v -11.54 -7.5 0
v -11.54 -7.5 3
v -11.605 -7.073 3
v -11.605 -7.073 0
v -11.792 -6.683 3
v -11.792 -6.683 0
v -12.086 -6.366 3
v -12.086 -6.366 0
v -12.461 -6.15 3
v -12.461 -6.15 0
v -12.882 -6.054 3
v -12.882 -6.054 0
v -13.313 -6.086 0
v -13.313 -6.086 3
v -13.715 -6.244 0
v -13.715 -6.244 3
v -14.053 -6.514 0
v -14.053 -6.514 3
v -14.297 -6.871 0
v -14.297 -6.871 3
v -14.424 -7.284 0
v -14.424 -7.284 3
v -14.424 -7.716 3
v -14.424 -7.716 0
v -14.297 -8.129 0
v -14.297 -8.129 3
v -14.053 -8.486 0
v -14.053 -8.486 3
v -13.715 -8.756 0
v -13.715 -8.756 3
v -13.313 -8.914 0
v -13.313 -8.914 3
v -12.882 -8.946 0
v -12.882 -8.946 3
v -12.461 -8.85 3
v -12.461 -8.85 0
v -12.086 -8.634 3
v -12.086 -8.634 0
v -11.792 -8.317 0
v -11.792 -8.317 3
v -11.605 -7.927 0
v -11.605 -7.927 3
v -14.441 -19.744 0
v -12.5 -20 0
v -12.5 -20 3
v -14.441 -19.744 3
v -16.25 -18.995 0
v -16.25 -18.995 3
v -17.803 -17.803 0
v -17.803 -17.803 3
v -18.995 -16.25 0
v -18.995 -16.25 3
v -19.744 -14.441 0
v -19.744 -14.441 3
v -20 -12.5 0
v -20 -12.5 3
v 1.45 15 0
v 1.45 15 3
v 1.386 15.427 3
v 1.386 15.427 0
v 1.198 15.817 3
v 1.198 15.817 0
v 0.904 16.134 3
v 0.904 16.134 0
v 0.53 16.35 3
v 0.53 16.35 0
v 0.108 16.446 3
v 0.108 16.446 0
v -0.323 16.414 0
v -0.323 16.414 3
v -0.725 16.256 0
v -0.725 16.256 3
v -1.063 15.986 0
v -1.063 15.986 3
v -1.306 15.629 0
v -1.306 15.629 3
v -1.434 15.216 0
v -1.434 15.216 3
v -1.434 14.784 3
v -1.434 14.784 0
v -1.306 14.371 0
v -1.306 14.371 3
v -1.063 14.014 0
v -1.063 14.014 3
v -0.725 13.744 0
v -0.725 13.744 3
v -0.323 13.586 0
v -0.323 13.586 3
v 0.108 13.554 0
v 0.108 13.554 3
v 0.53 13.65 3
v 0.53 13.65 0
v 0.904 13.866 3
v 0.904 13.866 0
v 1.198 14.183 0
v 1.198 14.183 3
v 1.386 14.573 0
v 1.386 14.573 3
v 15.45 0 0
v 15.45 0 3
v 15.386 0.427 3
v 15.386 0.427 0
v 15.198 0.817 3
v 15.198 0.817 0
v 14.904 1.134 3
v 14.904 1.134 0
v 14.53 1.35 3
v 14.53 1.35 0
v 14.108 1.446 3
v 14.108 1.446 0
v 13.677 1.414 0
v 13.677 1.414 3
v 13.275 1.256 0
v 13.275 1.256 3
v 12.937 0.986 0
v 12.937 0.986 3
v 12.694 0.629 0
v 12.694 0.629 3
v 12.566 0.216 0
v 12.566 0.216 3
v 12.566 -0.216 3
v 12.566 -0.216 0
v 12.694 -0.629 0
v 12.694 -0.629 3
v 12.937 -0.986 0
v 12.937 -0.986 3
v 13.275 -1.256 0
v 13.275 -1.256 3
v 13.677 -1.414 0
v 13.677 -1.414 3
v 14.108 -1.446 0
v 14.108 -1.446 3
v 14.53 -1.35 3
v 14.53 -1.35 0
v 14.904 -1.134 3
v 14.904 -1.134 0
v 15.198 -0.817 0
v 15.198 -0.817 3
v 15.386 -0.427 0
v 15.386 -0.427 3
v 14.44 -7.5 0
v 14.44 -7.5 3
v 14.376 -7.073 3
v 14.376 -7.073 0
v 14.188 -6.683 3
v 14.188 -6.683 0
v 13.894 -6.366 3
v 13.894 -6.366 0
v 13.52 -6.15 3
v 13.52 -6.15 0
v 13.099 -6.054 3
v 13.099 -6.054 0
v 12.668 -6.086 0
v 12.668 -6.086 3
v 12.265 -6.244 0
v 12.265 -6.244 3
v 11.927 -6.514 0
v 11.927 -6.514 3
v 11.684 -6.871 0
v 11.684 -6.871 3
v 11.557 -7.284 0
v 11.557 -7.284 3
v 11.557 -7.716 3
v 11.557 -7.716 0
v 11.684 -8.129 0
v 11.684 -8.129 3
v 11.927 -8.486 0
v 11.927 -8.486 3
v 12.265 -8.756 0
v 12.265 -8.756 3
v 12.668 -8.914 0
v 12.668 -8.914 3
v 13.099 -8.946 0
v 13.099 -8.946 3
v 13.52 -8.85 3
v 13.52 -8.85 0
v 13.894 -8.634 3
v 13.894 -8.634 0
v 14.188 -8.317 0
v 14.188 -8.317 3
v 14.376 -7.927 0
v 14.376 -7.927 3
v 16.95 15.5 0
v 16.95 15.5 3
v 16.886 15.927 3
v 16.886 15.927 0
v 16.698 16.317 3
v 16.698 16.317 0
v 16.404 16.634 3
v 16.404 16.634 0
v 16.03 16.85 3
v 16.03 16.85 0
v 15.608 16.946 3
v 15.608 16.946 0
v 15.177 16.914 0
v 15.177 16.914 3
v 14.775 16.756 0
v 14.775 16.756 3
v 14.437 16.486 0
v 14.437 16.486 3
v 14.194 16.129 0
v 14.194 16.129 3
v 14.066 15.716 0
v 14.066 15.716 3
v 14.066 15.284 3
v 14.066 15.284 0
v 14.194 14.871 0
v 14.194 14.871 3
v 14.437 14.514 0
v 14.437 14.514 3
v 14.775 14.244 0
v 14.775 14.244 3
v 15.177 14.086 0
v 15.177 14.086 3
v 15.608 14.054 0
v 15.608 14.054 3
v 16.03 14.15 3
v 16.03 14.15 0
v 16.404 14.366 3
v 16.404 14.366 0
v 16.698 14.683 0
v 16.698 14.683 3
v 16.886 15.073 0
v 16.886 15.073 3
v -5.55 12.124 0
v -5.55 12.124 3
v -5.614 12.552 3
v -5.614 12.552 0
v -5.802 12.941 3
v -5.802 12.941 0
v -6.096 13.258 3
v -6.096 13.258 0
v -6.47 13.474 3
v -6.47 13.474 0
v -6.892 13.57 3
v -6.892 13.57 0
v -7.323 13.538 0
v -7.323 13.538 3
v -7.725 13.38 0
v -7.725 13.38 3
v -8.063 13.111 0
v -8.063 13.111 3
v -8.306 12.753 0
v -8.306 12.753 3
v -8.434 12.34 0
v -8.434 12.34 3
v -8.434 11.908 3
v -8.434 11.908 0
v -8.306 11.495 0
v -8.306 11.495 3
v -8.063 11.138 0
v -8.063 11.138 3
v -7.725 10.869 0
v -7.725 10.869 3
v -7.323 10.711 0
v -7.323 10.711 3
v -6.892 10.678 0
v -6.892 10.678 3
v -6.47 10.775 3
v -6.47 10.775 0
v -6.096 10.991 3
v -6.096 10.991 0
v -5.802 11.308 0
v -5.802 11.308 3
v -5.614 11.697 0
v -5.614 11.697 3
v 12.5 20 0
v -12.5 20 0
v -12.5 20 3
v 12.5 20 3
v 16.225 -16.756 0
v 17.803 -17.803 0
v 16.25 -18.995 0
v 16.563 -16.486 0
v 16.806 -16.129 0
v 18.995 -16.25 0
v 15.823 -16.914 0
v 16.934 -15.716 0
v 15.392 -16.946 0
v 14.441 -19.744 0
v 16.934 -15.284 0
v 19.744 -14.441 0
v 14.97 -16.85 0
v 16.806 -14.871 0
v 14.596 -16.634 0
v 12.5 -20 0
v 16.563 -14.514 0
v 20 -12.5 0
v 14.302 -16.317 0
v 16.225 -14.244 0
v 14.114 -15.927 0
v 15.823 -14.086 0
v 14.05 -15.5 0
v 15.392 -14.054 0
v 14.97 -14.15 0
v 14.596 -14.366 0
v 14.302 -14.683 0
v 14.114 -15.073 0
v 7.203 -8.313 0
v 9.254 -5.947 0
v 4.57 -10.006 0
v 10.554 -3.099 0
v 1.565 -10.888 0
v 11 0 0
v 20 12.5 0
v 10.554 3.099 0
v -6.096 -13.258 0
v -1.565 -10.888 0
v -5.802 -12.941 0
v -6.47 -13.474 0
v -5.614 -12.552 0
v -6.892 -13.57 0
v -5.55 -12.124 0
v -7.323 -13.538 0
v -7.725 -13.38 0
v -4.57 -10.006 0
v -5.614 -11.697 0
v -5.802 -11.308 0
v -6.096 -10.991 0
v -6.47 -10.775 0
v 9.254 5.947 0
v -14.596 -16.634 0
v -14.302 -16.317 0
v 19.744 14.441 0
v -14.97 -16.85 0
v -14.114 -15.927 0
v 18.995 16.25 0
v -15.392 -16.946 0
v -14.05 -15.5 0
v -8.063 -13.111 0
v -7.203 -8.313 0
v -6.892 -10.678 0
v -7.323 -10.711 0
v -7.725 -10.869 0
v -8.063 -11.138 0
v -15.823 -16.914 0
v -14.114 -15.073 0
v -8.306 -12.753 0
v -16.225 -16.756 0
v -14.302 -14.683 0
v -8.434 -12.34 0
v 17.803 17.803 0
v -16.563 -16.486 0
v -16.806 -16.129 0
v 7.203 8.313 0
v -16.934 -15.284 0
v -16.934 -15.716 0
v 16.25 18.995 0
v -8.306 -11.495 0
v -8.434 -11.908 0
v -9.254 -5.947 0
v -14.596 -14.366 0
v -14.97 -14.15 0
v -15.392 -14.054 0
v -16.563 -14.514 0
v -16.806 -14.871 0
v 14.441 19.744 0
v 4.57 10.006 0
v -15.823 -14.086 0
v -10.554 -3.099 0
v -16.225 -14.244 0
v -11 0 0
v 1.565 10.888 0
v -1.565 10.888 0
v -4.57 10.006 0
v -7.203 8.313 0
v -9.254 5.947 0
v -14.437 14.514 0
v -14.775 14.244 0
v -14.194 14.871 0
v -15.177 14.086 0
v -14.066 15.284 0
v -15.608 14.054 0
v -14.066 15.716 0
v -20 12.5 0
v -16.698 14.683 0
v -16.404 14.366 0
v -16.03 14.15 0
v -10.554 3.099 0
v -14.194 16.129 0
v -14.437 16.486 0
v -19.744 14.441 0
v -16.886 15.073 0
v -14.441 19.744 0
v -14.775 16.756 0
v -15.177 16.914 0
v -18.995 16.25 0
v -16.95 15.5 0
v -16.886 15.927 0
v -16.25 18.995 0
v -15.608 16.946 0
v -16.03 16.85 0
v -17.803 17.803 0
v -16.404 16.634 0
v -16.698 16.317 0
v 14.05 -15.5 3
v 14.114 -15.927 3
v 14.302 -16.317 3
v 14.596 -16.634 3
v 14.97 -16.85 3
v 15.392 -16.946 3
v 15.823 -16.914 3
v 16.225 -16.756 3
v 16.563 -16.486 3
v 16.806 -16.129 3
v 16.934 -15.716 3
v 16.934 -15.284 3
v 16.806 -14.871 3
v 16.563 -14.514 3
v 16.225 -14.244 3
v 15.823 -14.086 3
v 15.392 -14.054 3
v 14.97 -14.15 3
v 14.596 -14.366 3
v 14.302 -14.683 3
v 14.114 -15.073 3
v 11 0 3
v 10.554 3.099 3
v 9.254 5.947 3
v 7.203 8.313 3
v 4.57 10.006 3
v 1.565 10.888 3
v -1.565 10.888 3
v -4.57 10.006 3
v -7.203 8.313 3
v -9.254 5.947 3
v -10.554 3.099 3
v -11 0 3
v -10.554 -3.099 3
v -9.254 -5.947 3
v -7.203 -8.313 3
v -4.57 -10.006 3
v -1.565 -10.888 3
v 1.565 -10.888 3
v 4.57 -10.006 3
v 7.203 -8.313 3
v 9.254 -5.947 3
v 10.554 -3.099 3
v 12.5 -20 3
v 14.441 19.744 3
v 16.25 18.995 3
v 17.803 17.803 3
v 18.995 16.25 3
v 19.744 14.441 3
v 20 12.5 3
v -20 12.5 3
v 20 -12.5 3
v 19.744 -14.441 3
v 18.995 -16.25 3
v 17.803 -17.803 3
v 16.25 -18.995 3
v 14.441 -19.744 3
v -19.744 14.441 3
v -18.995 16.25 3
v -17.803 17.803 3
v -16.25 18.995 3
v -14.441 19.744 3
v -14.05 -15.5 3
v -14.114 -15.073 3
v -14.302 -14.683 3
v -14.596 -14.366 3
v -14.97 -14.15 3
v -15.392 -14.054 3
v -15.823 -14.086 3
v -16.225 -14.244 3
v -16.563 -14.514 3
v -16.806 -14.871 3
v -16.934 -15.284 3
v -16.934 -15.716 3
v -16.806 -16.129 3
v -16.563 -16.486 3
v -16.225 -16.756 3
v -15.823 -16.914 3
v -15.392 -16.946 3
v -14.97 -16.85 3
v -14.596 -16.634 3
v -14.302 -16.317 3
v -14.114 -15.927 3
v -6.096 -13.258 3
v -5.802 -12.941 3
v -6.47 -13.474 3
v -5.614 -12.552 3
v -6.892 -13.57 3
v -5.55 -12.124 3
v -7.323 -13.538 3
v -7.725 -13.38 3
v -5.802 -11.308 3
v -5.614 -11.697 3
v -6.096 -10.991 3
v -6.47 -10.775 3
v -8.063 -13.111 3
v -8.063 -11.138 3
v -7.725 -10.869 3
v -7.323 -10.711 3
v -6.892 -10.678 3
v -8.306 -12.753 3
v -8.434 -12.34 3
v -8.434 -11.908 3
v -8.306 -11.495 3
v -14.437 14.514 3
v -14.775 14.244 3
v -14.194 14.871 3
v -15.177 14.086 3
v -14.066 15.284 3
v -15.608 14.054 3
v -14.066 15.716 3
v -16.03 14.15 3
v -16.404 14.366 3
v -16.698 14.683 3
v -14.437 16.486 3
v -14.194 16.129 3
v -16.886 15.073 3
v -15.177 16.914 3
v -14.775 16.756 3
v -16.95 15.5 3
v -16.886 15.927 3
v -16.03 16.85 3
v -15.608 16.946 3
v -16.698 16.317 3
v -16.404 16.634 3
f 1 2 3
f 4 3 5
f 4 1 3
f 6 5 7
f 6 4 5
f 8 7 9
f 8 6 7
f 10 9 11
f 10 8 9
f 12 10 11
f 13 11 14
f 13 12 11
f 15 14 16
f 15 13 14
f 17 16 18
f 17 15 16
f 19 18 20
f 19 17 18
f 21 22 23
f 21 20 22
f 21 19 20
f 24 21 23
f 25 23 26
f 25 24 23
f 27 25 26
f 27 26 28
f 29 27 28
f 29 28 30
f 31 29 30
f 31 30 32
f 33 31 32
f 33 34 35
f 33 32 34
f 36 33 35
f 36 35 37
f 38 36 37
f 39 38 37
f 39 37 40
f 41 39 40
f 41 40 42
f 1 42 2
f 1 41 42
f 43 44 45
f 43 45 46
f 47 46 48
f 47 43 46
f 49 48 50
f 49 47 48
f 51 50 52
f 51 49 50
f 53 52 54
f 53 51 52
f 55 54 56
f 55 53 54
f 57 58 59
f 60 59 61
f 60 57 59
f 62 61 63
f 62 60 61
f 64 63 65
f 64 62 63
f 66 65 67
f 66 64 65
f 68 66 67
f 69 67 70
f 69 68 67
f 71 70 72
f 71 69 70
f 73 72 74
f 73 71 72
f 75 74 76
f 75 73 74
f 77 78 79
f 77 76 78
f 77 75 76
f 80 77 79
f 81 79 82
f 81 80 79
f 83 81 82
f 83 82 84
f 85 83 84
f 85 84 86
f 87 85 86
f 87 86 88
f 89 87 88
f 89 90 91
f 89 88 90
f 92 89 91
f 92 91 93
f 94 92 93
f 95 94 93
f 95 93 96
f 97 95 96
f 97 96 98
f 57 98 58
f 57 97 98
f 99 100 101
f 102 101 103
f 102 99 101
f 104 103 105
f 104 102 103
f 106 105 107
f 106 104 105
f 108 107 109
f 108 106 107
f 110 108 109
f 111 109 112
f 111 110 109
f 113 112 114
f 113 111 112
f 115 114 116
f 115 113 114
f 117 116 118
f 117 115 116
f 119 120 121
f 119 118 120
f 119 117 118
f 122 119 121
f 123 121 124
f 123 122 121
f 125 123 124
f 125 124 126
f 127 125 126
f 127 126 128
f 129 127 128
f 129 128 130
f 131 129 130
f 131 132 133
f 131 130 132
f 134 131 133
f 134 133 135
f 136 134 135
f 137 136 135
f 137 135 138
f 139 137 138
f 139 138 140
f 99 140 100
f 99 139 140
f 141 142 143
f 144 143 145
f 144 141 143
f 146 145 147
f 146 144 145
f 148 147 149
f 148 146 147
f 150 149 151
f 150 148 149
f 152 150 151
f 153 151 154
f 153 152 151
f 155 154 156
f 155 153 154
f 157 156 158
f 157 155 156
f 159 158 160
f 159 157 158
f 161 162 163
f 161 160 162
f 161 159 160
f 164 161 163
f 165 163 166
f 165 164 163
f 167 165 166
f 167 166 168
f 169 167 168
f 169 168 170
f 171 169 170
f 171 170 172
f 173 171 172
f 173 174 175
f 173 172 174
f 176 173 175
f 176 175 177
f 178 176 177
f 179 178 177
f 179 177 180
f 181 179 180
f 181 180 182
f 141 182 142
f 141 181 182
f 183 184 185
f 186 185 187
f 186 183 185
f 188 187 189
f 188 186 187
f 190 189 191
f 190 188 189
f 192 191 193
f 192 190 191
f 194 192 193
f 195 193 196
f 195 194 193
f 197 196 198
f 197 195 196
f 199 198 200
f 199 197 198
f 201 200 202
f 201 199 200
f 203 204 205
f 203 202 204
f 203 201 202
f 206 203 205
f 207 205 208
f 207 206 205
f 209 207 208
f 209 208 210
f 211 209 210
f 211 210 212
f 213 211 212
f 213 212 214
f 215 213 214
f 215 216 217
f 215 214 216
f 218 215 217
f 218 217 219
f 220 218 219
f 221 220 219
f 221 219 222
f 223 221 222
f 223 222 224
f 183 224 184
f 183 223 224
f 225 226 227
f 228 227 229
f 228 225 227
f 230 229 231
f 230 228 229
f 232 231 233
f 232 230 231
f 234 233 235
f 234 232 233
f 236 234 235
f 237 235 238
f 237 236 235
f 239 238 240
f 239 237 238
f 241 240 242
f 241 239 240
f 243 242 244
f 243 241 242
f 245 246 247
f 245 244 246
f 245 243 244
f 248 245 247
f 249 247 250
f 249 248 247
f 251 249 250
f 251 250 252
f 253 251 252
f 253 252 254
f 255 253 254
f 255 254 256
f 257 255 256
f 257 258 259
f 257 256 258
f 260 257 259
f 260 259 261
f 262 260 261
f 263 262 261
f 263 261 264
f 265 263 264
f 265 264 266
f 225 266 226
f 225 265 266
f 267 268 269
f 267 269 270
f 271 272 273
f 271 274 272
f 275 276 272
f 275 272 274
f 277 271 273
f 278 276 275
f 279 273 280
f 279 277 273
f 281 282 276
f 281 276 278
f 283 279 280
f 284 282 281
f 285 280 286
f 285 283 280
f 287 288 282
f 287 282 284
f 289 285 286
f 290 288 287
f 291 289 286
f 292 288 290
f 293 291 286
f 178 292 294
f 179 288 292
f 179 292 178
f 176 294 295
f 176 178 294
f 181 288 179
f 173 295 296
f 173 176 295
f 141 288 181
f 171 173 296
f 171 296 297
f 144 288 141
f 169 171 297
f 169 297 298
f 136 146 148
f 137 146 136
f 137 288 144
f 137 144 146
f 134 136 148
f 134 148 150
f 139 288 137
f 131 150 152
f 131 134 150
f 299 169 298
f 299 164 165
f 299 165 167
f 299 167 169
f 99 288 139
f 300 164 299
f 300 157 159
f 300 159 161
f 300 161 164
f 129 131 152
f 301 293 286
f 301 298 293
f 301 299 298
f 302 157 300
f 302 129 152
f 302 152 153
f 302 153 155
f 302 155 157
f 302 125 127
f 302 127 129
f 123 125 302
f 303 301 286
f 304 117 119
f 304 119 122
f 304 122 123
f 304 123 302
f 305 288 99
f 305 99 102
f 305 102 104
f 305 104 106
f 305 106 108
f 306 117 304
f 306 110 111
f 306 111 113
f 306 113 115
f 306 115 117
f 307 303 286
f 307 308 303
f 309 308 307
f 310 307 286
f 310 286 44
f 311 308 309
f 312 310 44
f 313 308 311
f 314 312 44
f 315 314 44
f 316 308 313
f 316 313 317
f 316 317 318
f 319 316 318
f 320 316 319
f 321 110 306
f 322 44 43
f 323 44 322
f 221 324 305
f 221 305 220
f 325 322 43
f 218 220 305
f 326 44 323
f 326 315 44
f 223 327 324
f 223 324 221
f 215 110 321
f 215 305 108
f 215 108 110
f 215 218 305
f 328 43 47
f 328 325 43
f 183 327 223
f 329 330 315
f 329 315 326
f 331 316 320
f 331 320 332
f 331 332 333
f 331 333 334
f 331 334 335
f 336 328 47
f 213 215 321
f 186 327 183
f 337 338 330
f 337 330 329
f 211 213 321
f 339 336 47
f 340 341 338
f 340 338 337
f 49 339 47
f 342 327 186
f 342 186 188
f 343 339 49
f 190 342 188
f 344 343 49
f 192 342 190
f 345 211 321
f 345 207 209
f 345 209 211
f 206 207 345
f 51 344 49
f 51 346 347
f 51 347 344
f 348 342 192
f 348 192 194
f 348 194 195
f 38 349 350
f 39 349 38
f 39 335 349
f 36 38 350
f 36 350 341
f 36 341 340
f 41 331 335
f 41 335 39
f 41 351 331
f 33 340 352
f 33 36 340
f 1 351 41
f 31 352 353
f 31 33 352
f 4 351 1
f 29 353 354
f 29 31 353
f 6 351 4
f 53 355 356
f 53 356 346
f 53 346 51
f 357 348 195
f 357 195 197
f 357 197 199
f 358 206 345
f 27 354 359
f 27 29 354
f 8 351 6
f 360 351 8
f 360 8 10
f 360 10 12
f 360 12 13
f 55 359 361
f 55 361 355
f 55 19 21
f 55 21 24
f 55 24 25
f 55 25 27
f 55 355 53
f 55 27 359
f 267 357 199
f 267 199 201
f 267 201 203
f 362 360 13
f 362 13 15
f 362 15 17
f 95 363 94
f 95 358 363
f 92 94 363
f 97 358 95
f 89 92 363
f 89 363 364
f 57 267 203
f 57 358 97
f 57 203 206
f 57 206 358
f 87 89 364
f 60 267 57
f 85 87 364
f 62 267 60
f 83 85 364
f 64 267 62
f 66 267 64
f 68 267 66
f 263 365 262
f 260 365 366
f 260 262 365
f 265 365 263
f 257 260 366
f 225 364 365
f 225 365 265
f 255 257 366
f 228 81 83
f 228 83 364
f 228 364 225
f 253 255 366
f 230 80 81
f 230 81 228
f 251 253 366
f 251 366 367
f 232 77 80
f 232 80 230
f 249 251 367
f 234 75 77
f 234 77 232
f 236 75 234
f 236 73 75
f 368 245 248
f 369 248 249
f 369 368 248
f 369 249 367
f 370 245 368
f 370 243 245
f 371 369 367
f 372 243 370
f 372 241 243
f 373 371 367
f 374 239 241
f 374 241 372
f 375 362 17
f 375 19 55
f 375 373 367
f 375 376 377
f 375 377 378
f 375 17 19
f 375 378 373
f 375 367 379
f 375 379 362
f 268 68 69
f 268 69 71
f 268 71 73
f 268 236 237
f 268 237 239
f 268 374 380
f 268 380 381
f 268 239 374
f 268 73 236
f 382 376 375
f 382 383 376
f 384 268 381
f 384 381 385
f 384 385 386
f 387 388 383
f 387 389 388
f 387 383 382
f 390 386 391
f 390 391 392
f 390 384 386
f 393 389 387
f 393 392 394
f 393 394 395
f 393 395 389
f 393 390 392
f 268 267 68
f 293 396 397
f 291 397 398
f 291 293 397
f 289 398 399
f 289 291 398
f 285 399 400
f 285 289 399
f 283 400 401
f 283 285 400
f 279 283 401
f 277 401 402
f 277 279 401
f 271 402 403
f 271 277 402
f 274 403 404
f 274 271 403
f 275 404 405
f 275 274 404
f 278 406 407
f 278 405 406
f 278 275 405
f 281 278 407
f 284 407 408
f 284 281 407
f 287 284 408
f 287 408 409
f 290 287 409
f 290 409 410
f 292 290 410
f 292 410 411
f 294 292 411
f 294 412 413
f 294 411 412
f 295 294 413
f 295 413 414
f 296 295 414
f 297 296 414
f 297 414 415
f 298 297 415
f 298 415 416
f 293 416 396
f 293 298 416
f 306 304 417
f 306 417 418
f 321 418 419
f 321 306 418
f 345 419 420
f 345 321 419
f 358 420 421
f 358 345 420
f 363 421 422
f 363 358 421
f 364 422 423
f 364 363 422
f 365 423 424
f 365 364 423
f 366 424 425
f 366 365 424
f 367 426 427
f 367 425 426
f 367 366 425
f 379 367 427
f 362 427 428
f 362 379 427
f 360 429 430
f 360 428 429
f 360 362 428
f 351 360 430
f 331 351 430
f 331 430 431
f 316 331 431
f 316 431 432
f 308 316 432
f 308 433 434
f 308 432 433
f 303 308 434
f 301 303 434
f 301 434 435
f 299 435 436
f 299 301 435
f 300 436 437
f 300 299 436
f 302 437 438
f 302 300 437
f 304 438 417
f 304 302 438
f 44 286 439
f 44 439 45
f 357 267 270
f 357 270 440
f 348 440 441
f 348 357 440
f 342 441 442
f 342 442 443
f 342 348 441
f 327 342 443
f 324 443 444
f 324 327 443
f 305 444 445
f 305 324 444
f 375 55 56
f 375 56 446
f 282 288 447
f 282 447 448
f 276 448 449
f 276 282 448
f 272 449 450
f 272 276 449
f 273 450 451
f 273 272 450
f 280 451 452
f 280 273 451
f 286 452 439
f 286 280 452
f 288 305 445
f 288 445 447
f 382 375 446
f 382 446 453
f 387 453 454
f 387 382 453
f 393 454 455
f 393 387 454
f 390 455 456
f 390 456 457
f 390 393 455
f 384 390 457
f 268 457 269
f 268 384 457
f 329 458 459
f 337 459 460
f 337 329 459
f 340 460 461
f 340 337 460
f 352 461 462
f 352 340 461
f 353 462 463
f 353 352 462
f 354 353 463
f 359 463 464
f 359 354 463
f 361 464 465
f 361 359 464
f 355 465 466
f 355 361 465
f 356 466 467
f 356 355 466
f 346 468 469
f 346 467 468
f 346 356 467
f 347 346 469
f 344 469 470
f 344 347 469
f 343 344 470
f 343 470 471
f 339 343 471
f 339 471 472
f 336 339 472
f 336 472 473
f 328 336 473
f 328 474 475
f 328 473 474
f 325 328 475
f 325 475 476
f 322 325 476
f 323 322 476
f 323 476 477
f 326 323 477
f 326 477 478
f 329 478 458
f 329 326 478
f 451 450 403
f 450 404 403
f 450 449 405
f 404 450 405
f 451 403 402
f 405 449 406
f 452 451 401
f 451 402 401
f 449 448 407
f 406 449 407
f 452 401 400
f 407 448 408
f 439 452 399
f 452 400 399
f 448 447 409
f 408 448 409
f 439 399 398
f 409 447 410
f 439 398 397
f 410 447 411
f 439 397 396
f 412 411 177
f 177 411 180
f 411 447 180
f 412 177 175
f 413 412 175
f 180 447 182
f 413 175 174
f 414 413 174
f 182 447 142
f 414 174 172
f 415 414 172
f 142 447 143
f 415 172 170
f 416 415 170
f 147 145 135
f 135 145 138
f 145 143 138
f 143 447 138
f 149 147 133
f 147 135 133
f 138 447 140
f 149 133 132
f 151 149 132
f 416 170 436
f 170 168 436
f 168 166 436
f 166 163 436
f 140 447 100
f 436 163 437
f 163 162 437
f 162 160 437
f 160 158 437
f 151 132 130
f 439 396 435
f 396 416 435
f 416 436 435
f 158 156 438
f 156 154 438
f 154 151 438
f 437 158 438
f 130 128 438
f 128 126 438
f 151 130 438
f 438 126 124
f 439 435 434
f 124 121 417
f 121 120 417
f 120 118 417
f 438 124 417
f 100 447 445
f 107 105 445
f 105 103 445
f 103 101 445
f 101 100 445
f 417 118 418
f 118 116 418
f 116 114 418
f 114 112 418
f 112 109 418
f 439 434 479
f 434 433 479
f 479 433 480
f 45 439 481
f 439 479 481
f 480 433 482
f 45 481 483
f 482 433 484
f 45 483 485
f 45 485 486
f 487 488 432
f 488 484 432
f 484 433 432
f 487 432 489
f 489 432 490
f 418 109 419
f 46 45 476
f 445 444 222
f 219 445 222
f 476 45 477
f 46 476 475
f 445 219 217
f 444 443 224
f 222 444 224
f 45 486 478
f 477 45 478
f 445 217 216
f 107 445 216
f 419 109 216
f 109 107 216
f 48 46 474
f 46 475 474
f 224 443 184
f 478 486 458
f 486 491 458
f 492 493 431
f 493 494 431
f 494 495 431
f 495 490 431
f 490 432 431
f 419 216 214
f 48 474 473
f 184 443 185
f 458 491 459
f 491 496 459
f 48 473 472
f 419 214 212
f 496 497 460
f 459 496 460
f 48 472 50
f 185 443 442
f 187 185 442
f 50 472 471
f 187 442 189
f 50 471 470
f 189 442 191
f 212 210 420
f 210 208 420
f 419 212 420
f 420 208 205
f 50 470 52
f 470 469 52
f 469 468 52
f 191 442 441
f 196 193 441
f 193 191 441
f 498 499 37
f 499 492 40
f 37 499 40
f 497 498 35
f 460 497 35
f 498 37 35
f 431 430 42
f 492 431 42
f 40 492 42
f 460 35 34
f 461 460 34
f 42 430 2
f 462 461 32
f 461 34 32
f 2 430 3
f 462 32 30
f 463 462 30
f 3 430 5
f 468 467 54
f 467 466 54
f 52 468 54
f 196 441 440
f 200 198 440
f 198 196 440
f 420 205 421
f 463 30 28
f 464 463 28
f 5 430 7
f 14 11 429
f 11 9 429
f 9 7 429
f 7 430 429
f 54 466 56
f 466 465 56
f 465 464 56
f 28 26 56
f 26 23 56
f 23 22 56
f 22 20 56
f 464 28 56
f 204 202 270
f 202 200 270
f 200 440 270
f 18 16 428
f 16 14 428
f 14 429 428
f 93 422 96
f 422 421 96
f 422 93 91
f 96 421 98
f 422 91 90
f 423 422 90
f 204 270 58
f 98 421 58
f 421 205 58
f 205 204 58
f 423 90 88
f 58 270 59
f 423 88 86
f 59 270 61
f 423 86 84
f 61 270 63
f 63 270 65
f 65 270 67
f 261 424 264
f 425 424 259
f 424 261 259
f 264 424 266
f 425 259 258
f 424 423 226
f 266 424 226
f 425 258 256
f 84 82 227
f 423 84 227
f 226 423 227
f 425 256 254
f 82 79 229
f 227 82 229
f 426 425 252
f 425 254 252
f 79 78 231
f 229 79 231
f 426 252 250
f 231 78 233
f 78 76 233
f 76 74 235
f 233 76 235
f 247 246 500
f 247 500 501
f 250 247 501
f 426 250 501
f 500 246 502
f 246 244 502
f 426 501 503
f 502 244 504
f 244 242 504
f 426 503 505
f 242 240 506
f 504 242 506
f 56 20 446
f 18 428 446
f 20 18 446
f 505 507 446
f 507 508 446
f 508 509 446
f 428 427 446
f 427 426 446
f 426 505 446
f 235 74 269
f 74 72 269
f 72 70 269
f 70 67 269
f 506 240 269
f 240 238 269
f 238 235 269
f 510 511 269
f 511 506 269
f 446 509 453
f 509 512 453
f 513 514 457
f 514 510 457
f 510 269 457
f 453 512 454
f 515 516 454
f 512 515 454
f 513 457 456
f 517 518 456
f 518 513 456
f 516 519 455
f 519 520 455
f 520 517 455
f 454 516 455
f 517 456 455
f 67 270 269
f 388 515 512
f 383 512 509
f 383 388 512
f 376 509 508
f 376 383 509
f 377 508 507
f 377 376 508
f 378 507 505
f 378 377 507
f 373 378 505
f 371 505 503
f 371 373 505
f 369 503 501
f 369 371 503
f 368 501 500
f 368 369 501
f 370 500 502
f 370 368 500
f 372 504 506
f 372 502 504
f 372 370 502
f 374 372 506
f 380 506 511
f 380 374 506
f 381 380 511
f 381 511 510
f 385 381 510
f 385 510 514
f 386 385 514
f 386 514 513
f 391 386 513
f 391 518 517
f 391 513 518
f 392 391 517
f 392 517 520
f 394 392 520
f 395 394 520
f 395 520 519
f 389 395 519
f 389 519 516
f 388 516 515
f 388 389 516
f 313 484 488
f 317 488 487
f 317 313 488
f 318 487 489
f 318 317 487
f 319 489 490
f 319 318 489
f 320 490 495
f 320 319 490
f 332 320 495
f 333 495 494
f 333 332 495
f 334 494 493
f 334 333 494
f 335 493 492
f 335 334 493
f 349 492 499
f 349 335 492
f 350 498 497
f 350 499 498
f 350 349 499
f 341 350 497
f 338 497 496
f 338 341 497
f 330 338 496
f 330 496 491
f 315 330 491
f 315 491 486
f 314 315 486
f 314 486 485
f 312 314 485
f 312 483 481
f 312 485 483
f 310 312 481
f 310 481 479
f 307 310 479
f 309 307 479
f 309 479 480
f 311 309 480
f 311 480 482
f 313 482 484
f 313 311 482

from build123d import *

# Parameters (mm, degrees)
EXTRUDE_1_DEPTH     = 3
SKETCH_2_R          = 1.45
SKETCH_2_R_2        = 11
CUT_EXTRUDE_1_DEPTH = 5


with BuildPart() as part:
    # 草图1 → 凸台-拉伸1 (new body)
    with BuildSketch(Plane.XY):
        with BuildLine():
            Line((-12.500001384, 20), (12.499999997, 20))
            ThreePointArc((12.499999997, 20), (17.803300858, 17.80330086), (20, 12.5))
            Line((20, 12.5), (20, -12.5))
            ThreePointArc((20, -12.5), (17.803300859, -17.803300859), (12.5, -20))
            Line((12.5, -20), (-12.5, -20))
            ThreePointArc((-12.5, -20), (-17.80330064, -17.803301077), (-20, -12.500000618))
            Line((-20, -12.500000618), (-20, 12.5))
            ThreePointArc((-20, 12.5), (-17.803301348, 17.80330037), (-12.500001384, 20))
        make_face()
    extrude(amount=EXTRUDE_1_DEPTH)

    # 草图2 → 切除-拉伸1 (cut)
    with BuildSketch(Plane.XY):
        with Locations((15.5, 15.5)):
            Circle(SKETCH_2_R)
        with Locations(Location((-15.5, 15.5, 0), (0, 0, 180))):
            Circle(SKETCH_2_R)
        with Locations(Location((15.5, -15.5, 0), (0, 0, 180))):
            Circle(SKETCH_2_R)
        with Locations((-15.5, -15.5)):
            Circle(SKETCH_2_R)
        with Locations((0, 15)):
            Circle(SKETCH_2_R)
        with Locations((14, 0)):
            Circle(SKETCH_2_R)
        with Locations((-7, -12.124355653)):
            Circle(SKETCH_2_R)
        with Locations((-12.990381057, -7.5)):
            Circle(SKETCH_2_R)
        with Locations((12.990381057, -7.5)):
            Circle(SKETCH_2_R)
        with Locations((-7, 12.124355653)):
            Circle(SKETCH_2_R)
        Circle(SKETCH_2_R_2)
    extrude(amount=CUT_EXTRUDE_1_DEPTH, mode=Mode.SUBTRACT)


solid = part.part
